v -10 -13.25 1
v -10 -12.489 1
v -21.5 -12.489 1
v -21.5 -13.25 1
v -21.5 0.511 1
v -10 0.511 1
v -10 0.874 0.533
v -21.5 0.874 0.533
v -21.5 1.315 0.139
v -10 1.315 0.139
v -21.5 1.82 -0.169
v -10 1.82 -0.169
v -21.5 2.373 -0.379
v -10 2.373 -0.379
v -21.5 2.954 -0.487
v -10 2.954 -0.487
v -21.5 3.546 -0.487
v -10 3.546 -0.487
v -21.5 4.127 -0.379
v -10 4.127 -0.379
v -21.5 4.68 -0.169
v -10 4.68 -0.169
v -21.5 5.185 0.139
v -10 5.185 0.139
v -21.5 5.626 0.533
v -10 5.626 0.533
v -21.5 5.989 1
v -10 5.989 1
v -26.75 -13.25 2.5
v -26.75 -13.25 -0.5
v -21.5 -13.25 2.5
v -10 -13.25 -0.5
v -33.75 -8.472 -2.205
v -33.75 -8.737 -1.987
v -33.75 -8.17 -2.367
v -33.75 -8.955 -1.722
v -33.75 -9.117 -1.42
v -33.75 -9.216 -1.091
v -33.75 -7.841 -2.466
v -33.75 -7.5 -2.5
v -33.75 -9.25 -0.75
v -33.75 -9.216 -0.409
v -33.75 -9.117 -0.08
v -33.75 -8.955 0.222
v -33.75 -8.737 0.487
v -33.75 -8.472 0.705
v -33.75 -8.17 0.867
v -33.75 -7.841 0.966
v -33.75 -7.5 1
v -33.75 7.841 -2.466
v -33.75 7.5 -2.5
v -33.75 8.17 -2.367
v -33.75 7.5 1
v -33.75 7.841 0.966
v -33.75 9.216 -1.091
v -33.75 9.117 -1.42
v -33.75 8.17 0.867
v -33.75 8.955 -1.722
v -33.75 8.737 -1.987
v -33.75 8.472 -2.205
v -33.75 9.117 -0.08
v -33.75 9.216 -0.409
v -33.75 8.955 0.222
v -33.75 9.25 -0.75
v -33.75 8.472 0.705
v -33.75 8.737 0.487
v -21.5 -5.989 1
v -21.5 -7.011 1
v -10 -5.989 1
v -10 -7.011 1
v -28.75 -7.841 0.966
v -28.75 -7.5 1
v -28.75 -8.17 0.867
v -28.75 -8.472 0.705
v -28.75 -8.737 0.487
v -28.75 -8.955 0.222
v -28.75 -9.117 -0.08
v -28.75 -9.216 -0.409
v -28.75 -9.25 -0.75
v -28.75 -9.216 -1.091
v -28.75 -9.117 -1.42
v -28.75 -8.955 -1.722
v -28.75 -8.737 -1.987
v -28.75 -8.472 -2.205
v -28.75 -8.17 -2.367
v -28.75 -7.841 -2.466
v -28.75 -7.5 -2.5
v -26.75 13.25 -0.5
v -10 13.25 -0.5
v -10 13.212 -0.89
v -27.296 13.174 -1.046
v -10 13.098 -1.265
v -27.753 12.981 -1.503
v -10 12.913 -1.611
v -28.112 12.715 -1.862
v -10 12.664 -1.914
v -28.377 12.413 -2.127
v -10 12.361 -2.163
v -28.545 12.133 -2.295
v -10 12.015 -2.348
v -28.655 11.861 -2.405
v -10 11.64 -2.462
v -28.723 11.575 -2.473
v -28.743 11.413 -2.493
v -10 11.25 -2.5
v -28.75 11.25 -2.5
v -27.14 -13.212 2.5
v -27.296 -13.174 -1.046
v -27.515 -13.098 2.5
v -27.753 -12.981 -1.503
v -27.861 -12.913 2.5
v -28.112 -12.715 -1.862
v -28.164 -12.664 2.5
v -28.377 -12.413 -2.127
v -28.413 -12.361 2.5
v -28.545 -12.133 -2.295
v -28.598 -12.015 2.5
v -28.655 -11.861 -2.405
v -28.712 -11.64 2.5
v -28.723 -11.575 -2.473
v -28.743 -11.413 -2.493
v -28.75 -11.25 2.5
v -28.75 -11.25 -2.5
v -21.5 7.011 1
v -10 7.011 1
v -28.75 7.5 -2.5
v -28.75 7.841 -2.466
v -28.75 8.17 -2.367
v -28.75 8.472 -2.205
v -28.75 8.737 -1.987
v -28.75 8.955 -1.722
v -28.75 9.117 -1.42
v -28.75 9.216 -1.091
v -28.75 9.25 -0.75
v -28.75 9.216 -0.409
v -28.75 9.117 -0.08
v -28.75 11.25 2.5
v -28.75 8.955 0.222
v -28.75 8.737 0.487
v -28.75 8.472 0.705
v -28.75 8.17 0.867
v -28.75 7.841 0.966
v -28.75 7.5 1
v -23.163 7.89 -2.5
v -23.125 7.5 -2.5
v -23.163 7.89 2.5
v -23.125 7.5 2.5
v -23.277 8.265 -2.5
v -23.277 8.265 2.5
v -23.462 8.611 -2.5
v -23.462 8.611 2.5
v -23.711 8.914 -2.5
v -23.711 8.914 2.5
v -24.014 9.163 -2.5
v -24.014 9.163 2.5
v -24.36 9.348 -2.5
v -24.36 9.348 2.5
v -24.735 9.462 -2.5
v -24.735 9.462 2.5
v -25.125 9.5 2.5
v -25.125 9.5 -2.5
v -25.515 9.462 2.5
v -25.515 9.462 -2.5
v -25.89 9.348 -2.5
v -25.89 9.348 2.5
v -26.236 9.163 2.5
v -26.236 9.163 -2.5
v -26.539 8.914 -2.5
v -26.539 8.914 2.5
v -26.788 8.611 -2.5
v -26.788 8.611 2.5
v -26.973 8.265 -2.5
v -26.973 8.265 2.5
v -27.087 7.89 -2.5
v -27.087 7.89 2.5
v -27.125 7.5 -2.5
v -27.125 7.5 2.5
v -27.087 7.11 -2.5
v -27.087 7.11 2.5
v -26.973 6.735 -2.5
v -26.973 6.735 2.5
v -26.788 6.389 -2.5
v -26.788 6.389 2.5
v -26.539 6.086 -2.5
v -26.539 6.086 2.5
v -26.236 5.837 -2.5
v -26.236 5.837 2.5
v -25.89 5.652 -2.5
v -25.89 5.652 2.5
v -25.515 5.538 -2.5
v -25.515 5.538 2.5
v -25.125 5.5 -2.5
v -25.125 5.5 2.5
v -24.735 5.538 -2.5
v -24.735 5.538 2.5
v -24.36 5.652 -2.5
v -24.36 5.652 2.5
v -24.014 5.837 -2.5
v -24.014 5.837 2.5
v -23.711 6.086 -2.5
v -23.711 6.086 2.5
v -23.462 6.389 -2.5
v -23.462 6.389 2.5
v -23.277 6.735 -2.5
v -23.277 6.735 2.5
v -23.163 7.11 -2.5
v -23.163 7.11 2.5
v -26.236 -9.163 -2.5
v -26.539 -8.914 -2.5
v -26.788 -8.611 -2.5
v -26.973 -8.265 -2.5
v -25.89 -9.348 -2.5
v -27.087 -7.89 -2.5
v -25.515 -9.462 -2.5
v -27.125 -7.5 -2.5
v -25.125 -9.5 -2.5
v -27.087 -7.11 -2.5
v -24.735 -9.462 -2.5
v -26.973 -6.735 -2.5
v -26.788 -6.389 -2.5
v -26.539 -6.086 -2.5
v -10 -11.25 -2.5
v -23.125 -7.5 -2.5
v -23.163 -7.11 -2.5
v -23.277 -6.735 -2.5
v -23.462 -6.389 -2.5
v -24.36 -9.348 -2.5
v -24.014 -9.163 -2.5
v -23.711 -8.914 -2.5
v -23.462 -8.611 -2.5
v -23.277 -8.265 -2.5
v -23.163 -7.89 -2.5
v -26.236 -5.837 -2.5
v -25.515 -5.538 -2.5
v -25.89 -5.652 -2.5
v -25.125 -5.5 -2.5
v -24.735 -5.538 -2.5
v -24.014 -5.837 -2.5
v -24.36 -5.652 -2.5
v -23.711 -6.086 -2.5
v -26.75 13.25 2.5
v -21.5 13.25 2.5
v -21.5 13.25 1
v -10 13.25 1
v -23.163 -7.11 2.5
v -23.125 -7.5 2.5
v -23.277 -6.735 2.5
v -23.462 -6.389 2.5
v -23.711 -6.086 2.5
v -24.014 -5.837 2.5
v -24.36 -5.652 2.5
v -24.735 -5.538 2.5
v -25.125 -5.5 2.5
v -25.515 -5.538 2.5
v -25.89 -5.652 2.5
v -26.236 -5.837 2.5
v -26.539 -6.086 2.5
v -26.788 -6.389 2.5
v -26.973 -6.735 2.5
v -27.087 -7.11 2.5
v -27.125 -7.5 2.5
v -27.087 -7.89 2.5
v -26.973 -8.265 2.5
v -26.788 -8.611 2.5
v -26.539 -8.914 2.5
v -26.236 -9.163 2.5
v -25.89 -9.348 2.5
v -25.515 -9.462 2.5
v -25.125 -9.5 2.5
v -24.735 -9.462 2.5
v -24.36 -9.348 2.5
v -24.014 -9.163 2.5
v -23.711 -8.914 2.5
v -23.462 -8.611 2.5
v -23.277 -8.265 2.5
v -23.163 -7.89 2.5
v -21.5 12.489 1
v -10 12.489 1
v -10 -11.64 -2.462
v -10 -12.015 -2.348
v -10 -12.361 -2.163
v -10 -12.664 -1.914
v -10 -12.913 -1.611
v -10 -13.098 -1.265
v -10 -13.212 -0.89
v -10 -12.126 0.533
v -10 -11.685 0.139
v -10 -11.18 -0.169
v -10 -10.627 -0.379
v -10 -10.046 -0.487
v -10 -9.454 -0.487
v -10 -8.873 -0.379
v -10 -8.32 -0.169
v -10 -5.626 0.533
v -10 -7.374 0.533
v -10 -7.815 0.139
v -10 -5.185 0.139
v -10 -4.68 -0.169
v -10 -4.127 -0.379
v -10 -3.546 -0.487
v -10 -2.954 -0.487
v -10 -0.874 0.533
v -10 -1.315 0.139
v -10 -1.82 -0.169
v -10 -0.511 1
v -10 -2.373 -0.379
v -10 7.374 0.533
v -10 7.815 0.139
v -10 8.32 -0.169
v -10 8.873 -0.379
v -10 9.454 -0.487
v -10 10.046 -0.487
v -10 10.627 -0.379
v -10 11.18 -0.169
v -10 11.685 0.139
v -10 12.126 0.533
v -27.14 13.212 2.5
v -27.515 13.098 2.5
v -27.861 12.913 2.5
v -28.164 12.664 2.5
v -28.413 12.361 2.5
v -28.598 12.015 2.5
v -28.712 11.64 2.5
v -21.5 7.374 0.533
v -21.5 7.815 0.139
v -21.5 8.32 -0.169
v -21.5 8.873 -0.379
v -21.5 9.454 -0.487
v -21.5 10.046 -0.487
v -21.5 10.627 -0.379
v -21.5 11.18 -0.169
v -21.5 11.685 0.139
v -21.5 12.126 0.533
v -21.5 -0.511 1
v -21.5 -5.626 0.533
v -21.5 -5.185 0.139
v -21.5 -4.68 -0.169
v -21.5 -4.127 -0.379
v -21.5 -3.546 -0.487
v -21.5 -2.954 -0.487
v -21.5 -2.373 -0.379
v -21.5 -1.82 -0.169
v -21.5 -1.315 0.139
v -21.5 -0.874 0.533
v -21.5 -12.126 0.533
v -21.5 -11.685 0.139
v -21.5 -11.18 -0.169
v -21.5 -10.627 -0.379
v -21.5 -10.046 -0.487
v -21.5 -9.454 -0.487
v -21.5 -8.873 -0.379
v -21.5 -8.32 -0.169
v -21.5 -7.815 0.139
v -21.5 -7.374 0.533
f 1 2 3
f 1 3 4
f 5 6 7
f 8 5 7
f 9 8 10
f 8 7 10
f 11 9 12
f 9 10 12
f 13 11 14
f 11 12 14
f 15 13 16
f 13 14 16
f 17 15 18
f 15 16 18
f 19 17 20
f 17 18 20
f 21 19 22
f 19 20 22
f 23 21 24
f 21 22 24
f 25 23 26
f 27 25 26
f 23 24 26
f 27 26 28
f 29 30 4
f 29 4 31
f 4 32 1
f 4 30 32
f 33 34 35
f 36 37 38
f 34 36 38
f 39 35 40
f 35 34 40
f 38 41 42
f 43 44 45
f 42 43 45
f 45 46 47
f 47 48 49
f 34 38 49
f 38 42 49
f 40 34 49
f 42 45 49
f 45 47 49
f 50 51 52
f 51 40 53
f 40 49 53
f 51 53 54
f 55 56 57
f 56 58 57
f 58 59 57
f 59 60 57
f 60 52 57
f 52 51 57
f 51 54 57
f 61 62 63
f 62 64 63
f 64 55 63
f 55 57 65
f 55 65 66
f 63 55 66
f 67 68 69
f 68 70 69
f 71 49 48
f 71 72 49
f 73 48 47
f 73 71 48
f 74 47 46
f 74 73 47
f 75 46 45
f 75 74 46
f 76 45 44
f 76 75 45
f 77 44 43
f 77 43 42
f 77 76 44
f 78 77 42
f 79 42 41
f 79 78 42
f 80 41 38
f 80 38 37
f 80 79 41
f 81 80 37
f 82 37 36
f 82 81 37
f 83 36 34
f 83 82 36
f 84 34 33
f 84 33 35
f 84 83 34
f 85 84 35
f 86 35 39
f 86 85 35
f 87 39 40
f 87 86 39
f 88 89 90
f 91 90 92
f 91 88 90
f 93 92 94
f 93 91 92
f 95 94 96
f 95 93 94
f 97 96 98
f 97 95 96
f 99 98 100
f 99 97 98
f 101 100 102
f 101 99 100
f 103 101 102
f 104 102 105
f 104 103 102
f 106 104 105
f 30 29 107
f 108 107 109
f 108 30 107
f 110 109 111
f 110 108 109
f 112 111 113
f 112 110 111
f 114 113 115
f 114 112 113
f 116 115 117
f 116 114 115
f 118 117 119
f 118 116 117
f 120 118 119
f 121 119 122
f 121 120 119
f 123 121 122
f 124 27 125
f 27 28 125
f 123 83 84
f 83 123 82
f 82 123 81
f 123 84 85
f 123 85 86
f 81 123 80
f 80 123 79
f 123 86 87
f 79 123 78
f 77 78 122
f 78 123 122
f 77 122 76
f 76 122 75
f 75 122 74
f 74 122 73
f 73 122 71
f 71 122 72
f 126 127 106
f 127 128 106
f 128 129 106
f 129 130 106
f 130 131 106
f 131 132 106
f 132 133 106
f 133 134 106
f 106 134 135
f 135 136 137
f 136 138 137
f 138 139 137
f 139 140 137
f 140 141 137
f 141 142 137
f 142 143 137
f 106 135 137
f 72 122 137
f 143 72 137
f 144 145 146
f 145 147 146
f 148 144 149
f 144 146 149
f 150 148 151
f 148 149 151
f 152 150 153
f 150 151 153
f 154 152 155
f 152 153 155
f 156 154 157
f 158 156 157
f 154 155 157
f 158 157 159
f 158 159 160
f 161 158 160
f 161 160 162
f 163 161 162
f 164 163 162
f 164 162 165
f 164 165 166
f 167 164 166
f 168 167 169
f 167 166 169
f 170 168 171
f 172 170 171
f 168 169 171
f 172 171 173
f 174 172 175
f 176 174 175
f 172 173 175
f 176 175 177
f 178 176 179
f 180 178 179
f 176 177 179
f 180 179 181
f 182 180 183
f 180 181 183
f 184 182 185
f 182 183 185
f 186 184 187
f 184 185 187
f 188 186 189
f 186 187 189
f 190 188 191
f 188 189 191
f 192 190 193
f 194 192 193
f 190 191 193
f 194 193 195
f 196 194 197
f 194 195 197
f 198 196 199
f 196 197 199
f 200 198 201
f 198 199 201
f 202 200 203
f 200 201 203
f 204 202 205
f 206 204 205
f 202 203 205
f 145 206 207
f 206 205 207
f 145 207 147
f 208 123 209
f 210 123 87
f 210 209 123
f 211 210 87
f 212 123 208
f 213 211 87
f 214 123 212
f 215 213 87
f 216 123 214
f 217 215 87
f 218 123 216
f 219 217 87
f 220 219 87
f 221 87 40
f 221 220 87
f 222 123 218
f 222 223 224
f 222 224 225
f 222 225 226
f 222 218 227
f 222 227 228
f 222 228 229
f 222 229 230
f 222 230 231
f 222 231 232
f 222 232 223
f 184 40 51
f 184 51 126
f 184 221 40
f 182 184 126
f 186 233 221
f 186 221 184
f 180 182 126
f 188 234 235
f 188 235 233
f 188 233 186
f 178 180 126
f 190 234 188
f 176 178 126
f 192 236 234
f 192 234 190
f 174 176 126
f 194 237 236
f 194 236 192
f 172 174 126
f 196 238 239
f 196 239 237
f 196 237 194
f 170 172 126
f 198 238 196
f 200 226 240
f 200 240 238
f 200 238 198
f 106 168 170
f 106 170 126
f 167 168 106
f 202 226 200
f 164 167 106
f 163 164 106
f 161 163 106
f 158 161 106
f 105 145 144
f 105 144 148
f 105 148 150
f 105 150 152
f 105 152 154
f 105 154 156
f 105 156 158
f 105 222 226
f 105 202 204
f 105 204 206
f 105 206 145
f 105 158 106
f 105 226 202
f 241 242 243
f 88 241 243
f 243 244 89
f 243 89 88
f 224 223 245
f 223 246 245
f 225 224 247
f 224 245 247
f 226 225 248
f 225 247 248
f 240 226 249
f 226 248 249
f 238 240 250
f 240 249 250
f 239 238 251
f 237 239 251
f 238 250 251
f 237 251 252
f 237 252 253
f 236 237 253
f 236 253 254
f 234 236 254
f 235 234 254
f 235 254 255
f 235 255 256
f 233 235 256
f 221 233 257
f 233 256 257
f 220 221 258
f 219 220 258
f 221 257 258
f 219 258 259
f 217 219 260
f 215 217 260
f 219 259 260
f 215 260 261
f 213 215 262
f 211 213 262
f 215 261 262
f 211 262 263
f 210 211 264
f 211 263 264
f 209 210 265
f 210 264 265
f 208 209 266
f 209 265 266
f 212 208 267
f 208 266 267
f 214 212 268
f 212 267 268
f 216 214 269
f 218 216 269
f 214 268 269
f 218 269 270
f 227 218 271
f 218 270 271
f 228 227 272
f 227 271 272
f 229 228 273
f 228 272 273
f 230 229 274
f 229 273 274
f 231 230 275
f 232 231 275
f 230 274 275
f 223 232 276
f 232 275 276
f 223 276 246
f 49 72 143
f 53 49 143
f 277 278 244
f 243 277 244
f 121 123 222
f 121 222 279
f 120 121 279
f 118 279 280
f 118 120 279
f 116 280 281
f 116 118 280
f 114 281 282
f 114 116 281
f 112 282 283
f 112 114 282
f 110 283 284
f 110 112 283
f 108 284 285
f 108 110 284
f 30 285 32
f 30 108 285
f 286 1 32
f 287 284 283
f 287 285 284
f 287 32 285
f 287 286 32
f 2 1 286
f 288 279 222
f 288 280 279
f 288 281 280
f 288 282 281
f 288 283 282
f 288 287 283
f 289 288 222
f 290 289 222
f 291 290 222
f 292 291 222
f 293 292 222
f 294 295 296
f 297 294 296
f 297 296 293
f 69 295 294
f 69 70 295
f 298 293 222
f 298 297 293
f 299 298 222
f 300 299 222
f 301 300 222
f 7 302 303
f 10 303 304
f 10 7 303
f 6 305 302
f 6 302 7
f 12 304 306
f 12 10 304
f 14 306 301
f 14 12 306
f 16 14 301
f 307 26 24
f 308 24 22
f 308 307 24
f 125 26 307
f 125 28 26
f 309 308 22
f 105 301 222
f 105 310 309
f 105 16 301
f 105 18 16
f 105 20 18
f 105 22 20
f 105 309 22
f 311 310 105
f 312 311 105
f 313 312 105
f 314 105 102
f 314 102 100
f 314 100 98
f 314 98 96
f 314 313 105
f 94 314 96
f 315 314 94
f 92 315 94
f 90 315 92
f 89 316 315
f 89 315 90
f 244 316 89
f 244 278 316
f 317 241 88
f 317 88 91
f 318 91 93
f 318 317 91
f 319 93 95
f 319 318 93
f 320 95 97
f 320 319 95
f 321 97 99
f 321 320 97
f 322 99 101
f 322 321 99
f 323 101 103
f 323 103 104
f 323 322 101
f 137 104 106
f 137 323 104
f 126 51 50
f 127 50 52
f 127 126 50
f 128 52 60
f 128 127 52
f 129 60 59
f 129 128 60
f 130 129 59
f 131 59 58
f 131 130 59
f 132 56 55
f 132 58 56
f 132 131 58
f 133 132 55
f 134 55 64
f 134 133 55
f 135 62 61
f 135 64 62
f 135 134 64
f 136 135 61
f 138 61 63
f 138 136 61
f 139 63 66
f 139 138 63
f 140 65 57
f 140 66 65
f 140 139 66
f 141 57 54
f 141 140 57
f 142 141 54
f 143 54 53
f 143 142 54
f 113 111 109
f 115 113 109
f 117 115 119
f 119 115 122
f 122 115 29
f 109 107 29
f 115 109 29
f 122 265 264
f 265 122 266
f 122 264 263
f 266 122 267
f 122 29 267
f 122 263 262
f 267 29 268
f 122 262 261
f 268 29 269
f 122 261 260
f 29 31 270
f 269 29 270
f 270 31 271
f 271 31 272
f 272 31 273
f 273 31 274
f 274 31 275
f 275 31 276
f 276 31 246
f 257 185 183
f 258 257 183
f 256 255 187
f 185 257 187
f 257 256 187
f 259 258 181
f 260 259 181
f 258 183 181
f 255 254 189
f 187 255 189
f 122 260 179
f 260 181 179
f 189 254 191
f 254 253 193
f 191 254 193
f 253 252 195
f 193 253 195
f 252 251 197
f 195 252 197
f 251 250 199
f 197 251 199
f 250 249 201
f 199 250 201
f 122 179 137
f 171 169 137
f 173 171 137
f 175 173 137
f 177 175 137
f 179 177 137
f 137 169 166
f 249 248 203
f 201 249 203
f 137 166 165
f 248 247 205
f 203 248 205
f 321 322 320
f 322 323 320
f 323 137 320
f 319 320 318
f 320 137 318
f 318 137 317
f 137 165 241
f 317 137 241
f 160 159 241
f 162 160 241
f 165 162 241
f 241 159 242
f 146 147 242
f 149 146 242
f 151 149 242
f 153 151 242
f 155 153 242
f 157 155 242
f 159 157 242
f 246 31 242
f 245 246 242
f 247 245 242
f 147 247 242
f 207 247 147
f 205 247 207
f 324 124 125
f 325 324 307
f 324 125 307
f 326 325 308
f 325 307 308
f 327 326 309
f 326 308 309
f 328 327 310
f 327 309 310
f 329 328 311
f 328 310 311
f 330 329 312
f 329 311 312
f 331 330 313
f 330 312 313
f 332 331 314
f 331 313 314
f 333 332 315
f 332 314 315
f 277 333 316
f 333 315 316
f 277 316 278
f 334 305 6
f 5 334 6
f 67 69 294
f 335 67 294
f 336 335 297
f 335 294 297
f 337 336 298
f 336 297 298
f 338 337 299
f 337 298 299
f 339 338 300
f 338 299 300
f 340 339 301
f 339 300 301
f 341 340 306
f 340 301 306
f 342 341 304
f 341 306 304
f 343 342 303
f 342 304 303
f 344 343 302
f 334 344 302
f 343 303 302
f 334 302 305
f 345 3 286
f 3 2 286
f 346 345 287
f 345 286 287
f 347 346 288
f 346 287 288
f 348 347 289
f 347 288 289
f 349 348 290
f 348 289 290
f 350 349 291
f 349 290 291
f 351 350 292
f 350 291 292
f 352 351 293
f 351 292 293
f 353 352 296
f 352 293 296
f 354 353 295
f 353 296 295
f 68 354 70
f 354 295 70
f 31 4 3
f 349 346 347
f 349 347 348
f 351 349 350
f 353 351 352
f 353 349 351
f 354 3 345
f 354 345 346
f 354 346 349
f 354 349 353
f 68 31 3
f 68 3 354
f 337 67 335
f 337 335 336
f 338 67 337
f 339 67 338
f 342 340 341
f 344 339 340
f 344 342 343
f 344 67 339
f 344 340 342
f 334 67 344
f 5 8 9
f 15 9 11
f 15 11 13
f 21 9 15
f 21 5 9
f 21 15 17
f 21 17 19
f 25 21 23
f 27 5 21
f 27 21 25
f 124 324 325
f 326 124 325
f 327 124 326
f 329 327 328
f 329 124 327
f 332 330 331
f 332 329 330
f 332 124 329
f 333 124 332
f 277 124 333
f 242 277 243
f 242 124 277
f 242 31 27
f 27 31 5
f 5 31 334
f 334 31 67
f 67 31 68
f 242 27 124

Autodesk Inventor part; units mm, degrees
ref_plane "YZ Plane" through (0, 0, 0) normal (1, 0, 0) x (0, 1, 0)
ref_plane "XZ Plane" through (0, 0, 0) normal (0, 1, 0) x (-1, 0, 0)
ref_plane "XY Plane" through (0, 0, 0) normal (0, 0, 1) x (1, 0, 0)
sketch "スケッチ1" plane through (0, 0, 0) normal (1, 0, 0) x (0, 1, 0)
  arc A0 (-7.5, 1.25) -> (-7.5, -2.75) centre (-7.5, -0.75) ccw construction
  line L0 (-7.5, 1.25) -> (7.5, 1.25) construction
  line L1 (0, 2.5) -> (0, -2.5) construction
  arc A1 (7.5, -2.75) -> (7.5, 1.25) centre (7.5, -0.75) ccw construction
  arc A2 (-7.5, 1) -> (-7.5, -2.5) centre (-7.5, -0.75) ccw
  line L2 (-7.5, 1) -> (7.5, 1)
  line L3 (-7.5, -2.5) -> (7.5, -2.5)
  arc A3 (7.5, -2.5) -> (7.5, 1) centre (7.5, -0.75) ccw
  line L4 (-7.5, -2.75) -> (7.5, -2.75) construction
  line L5 (-13.5, 2.5) -> (13.5, 2.5) construction
  line L6 (13.5, 2.5) -> (13.5, -2.5) construction
  line L7 (13.5, -2.5) -> (-13.5, -2.5) construction
  line L8 (-13.5, -2.5) -> (-13.5, 2.5) construction
  line L9 (-13.5, 2.5) -> (13.5, -2.5) construction
  line L10 (13.5, 2.5) -> (-13.5, -2.5) construction
  line L11 (-13.25, 2.5) -> (13.25, 2.5)
  line L12 (13.25, 2.5) -> (13.25, -2.5)
  line L13 (13.25, -2.5) -> (-13.25, -2.5)
  line L14 (-13.25, -2.5) -> (-13.25, 2.5)
  line L15 (-13.25, 2.5) -> (13.25, -2.5) construction
  line L16 (13.25, 2.5) -> (-13.25, -2.5) construction
  circle A4 centre (-9.75, 2.75) radius 3.25 construction
  circle A5 centre (-3.25, 2.75) radius 3.25 construction
  circle A6 centre (3.25, 2.75) radius 3.25 construction
  circle A7 centre (9.75, 2.75) radius 3.25 construction
  arc A8 (-5.9886, 1) -> (-0.5114, 1) centre (-3.25, 2.75) ccw
  arc A9 (0.5114, 1) -> (5.9886, 1) centre (3.25, 2.75) ccw
  line L17 (-9.75, 2.75) -> (9.75, 2.75) construction
  line L18 (0, 2.5) -> (0, -2.75) construction
  line L19 (-7.0114, 1) -> (-5.9886, 1)
  line L20 (-0.5114, 1) -> (0.5114, 1)
  line L21 (5.9886, 1) -> (7.0114, 1)
  line L22 (-12.4886, 1) -> (-13.25, 1)
  line L23 (12.4886, 1) -> (13.25, 1)
  arc A10 (-12.9904, 2.5) -> (-12.9815, 2.404) centre (-9.75, 2.75) ccw
  arc A11 (-12.4886, 1) -> (-7.0114, 1) centre (-9.75, 2.75) ccw
  arc A12 (7.0114, 1) -> (12.4886, 1) centre (9.75, 2.75) ccw
  arc A13 (12.9815, 2.404) -> (12.9904, 2.5) centre (9.75, 2.75) ccw
  point P0 (0, 0)
  point P1 (0, 0)
  point P2 (0, 0)
  point P3 (-0.0096, 2.5)
  point P4 (0.0096, 2.5)
  point P5 (6.4904, 2.5)
  point P6 (0, 2.75)
  point P7 (-7.5, -2.5)
  point P8 (5.9886, 1)
  point P9 (0.5114, 1)
  point P10 (-0.5114, 1)
  point P11 (-5.9886, 1)
  point P12 (-6.9904, 2.5)
  point P13 (-7.0114, 1)
  point P14 (9.2254, -0.4574)
  point P15 (7.0114, 1)
  point P16 (-7.5, -2.5)
  point P17 (-9.2254, -0.4574)
  point P18 (-7.0114, 1)
  dimension "d0" = 2
  dimension "d1" = 15
  dimension "d2" = 0.25
  dimension "d3" = 6
  dimension "d4" = 6
  dimension "d5" = 0.25
  dimension "d6" = 5
  dimension "d7" = 6.5
  dimension "d8" = 6.5
  dimension "d10" = 6.5
  dimension "d12" = 6.5
  dimension "d27" = 1.5
  dimension "d28" = 2
  dimension "d29" = 0.7614
extrude "押し出し1" add sketch "スケッチ1" against normal blind 33.75 contours L2 A11 A2 | A11 L2 A8 A9 A12 A3 L3 A2 | L2 A8 | A12 L2 A3 | L2 A9
extrude "押し出し2" add sketch "スケッチ1" against normal blind 28.75
extrude "押し出し3" cut sketch "スケッチ1" against normal blind 21.5 contours L2 A11 A2 | A2 A11 L22 L14 L11 L12 L23 A12 A3 L2 | L2 A8 | A12 L2 A3 | L2 A9
extrude "押し出し4" cut sketch "スケッチ1" against normal blind 10
sketch "スケッチ2" plane through (-28.75, -13.25, 2.5) normal (0, 0, 1) x (1, 0, 0)
  line L0 (0, 0) -> (0, 26.5) projected
  line L1 (18.75, 26.5) -> (0, 26.5) projected
  line L2 (0, 0) -> (7.25, 0)
  line L3 (7.25, 0) -> (7.25, 26.5)
  line L4 (7.25, 26.5) -> (0, 26.5)
  line L5 (0, 26.5) -> (0, 0)
  line L6 (7.25, 0) -> (7.25, 26.5) projected
  line L7 (18.75, 0) -> (0, 0) projected
  line L8 (3.625, 0) -> (3.625, 26.5) construction
  line L9 (18.75, 26.5) -> (0, 26.5) projected
  circle A0 centre (3.625, 5.75) radius 2
  line L10 (0, 13.25) -> (7.25, 13.25) construction
  circle A1 centre (3.625, 20.75) radius 2
  point P0 (28.75, 13.25)
  point P1 (7.25, 0.2596)
  point P2 (7.25, 7.2404)
  point P3 (7.25, 26.2404)
  dimension "d23" = 4
  dimension "d24" = 15
extrude "押し出し5" cut sketch "スケッチ2" against normal through all contours A0 | A1
fillet "フィレット1" radius 2 4 edges at (-28.75, -13.25, 0) (-28.75, 13.25, 0) (-19.375, 13.25, -2.5) (-19.375, -13.25, -2.5)
equation "\"d5\" = d2"
properties part number "Weight_case_under"
